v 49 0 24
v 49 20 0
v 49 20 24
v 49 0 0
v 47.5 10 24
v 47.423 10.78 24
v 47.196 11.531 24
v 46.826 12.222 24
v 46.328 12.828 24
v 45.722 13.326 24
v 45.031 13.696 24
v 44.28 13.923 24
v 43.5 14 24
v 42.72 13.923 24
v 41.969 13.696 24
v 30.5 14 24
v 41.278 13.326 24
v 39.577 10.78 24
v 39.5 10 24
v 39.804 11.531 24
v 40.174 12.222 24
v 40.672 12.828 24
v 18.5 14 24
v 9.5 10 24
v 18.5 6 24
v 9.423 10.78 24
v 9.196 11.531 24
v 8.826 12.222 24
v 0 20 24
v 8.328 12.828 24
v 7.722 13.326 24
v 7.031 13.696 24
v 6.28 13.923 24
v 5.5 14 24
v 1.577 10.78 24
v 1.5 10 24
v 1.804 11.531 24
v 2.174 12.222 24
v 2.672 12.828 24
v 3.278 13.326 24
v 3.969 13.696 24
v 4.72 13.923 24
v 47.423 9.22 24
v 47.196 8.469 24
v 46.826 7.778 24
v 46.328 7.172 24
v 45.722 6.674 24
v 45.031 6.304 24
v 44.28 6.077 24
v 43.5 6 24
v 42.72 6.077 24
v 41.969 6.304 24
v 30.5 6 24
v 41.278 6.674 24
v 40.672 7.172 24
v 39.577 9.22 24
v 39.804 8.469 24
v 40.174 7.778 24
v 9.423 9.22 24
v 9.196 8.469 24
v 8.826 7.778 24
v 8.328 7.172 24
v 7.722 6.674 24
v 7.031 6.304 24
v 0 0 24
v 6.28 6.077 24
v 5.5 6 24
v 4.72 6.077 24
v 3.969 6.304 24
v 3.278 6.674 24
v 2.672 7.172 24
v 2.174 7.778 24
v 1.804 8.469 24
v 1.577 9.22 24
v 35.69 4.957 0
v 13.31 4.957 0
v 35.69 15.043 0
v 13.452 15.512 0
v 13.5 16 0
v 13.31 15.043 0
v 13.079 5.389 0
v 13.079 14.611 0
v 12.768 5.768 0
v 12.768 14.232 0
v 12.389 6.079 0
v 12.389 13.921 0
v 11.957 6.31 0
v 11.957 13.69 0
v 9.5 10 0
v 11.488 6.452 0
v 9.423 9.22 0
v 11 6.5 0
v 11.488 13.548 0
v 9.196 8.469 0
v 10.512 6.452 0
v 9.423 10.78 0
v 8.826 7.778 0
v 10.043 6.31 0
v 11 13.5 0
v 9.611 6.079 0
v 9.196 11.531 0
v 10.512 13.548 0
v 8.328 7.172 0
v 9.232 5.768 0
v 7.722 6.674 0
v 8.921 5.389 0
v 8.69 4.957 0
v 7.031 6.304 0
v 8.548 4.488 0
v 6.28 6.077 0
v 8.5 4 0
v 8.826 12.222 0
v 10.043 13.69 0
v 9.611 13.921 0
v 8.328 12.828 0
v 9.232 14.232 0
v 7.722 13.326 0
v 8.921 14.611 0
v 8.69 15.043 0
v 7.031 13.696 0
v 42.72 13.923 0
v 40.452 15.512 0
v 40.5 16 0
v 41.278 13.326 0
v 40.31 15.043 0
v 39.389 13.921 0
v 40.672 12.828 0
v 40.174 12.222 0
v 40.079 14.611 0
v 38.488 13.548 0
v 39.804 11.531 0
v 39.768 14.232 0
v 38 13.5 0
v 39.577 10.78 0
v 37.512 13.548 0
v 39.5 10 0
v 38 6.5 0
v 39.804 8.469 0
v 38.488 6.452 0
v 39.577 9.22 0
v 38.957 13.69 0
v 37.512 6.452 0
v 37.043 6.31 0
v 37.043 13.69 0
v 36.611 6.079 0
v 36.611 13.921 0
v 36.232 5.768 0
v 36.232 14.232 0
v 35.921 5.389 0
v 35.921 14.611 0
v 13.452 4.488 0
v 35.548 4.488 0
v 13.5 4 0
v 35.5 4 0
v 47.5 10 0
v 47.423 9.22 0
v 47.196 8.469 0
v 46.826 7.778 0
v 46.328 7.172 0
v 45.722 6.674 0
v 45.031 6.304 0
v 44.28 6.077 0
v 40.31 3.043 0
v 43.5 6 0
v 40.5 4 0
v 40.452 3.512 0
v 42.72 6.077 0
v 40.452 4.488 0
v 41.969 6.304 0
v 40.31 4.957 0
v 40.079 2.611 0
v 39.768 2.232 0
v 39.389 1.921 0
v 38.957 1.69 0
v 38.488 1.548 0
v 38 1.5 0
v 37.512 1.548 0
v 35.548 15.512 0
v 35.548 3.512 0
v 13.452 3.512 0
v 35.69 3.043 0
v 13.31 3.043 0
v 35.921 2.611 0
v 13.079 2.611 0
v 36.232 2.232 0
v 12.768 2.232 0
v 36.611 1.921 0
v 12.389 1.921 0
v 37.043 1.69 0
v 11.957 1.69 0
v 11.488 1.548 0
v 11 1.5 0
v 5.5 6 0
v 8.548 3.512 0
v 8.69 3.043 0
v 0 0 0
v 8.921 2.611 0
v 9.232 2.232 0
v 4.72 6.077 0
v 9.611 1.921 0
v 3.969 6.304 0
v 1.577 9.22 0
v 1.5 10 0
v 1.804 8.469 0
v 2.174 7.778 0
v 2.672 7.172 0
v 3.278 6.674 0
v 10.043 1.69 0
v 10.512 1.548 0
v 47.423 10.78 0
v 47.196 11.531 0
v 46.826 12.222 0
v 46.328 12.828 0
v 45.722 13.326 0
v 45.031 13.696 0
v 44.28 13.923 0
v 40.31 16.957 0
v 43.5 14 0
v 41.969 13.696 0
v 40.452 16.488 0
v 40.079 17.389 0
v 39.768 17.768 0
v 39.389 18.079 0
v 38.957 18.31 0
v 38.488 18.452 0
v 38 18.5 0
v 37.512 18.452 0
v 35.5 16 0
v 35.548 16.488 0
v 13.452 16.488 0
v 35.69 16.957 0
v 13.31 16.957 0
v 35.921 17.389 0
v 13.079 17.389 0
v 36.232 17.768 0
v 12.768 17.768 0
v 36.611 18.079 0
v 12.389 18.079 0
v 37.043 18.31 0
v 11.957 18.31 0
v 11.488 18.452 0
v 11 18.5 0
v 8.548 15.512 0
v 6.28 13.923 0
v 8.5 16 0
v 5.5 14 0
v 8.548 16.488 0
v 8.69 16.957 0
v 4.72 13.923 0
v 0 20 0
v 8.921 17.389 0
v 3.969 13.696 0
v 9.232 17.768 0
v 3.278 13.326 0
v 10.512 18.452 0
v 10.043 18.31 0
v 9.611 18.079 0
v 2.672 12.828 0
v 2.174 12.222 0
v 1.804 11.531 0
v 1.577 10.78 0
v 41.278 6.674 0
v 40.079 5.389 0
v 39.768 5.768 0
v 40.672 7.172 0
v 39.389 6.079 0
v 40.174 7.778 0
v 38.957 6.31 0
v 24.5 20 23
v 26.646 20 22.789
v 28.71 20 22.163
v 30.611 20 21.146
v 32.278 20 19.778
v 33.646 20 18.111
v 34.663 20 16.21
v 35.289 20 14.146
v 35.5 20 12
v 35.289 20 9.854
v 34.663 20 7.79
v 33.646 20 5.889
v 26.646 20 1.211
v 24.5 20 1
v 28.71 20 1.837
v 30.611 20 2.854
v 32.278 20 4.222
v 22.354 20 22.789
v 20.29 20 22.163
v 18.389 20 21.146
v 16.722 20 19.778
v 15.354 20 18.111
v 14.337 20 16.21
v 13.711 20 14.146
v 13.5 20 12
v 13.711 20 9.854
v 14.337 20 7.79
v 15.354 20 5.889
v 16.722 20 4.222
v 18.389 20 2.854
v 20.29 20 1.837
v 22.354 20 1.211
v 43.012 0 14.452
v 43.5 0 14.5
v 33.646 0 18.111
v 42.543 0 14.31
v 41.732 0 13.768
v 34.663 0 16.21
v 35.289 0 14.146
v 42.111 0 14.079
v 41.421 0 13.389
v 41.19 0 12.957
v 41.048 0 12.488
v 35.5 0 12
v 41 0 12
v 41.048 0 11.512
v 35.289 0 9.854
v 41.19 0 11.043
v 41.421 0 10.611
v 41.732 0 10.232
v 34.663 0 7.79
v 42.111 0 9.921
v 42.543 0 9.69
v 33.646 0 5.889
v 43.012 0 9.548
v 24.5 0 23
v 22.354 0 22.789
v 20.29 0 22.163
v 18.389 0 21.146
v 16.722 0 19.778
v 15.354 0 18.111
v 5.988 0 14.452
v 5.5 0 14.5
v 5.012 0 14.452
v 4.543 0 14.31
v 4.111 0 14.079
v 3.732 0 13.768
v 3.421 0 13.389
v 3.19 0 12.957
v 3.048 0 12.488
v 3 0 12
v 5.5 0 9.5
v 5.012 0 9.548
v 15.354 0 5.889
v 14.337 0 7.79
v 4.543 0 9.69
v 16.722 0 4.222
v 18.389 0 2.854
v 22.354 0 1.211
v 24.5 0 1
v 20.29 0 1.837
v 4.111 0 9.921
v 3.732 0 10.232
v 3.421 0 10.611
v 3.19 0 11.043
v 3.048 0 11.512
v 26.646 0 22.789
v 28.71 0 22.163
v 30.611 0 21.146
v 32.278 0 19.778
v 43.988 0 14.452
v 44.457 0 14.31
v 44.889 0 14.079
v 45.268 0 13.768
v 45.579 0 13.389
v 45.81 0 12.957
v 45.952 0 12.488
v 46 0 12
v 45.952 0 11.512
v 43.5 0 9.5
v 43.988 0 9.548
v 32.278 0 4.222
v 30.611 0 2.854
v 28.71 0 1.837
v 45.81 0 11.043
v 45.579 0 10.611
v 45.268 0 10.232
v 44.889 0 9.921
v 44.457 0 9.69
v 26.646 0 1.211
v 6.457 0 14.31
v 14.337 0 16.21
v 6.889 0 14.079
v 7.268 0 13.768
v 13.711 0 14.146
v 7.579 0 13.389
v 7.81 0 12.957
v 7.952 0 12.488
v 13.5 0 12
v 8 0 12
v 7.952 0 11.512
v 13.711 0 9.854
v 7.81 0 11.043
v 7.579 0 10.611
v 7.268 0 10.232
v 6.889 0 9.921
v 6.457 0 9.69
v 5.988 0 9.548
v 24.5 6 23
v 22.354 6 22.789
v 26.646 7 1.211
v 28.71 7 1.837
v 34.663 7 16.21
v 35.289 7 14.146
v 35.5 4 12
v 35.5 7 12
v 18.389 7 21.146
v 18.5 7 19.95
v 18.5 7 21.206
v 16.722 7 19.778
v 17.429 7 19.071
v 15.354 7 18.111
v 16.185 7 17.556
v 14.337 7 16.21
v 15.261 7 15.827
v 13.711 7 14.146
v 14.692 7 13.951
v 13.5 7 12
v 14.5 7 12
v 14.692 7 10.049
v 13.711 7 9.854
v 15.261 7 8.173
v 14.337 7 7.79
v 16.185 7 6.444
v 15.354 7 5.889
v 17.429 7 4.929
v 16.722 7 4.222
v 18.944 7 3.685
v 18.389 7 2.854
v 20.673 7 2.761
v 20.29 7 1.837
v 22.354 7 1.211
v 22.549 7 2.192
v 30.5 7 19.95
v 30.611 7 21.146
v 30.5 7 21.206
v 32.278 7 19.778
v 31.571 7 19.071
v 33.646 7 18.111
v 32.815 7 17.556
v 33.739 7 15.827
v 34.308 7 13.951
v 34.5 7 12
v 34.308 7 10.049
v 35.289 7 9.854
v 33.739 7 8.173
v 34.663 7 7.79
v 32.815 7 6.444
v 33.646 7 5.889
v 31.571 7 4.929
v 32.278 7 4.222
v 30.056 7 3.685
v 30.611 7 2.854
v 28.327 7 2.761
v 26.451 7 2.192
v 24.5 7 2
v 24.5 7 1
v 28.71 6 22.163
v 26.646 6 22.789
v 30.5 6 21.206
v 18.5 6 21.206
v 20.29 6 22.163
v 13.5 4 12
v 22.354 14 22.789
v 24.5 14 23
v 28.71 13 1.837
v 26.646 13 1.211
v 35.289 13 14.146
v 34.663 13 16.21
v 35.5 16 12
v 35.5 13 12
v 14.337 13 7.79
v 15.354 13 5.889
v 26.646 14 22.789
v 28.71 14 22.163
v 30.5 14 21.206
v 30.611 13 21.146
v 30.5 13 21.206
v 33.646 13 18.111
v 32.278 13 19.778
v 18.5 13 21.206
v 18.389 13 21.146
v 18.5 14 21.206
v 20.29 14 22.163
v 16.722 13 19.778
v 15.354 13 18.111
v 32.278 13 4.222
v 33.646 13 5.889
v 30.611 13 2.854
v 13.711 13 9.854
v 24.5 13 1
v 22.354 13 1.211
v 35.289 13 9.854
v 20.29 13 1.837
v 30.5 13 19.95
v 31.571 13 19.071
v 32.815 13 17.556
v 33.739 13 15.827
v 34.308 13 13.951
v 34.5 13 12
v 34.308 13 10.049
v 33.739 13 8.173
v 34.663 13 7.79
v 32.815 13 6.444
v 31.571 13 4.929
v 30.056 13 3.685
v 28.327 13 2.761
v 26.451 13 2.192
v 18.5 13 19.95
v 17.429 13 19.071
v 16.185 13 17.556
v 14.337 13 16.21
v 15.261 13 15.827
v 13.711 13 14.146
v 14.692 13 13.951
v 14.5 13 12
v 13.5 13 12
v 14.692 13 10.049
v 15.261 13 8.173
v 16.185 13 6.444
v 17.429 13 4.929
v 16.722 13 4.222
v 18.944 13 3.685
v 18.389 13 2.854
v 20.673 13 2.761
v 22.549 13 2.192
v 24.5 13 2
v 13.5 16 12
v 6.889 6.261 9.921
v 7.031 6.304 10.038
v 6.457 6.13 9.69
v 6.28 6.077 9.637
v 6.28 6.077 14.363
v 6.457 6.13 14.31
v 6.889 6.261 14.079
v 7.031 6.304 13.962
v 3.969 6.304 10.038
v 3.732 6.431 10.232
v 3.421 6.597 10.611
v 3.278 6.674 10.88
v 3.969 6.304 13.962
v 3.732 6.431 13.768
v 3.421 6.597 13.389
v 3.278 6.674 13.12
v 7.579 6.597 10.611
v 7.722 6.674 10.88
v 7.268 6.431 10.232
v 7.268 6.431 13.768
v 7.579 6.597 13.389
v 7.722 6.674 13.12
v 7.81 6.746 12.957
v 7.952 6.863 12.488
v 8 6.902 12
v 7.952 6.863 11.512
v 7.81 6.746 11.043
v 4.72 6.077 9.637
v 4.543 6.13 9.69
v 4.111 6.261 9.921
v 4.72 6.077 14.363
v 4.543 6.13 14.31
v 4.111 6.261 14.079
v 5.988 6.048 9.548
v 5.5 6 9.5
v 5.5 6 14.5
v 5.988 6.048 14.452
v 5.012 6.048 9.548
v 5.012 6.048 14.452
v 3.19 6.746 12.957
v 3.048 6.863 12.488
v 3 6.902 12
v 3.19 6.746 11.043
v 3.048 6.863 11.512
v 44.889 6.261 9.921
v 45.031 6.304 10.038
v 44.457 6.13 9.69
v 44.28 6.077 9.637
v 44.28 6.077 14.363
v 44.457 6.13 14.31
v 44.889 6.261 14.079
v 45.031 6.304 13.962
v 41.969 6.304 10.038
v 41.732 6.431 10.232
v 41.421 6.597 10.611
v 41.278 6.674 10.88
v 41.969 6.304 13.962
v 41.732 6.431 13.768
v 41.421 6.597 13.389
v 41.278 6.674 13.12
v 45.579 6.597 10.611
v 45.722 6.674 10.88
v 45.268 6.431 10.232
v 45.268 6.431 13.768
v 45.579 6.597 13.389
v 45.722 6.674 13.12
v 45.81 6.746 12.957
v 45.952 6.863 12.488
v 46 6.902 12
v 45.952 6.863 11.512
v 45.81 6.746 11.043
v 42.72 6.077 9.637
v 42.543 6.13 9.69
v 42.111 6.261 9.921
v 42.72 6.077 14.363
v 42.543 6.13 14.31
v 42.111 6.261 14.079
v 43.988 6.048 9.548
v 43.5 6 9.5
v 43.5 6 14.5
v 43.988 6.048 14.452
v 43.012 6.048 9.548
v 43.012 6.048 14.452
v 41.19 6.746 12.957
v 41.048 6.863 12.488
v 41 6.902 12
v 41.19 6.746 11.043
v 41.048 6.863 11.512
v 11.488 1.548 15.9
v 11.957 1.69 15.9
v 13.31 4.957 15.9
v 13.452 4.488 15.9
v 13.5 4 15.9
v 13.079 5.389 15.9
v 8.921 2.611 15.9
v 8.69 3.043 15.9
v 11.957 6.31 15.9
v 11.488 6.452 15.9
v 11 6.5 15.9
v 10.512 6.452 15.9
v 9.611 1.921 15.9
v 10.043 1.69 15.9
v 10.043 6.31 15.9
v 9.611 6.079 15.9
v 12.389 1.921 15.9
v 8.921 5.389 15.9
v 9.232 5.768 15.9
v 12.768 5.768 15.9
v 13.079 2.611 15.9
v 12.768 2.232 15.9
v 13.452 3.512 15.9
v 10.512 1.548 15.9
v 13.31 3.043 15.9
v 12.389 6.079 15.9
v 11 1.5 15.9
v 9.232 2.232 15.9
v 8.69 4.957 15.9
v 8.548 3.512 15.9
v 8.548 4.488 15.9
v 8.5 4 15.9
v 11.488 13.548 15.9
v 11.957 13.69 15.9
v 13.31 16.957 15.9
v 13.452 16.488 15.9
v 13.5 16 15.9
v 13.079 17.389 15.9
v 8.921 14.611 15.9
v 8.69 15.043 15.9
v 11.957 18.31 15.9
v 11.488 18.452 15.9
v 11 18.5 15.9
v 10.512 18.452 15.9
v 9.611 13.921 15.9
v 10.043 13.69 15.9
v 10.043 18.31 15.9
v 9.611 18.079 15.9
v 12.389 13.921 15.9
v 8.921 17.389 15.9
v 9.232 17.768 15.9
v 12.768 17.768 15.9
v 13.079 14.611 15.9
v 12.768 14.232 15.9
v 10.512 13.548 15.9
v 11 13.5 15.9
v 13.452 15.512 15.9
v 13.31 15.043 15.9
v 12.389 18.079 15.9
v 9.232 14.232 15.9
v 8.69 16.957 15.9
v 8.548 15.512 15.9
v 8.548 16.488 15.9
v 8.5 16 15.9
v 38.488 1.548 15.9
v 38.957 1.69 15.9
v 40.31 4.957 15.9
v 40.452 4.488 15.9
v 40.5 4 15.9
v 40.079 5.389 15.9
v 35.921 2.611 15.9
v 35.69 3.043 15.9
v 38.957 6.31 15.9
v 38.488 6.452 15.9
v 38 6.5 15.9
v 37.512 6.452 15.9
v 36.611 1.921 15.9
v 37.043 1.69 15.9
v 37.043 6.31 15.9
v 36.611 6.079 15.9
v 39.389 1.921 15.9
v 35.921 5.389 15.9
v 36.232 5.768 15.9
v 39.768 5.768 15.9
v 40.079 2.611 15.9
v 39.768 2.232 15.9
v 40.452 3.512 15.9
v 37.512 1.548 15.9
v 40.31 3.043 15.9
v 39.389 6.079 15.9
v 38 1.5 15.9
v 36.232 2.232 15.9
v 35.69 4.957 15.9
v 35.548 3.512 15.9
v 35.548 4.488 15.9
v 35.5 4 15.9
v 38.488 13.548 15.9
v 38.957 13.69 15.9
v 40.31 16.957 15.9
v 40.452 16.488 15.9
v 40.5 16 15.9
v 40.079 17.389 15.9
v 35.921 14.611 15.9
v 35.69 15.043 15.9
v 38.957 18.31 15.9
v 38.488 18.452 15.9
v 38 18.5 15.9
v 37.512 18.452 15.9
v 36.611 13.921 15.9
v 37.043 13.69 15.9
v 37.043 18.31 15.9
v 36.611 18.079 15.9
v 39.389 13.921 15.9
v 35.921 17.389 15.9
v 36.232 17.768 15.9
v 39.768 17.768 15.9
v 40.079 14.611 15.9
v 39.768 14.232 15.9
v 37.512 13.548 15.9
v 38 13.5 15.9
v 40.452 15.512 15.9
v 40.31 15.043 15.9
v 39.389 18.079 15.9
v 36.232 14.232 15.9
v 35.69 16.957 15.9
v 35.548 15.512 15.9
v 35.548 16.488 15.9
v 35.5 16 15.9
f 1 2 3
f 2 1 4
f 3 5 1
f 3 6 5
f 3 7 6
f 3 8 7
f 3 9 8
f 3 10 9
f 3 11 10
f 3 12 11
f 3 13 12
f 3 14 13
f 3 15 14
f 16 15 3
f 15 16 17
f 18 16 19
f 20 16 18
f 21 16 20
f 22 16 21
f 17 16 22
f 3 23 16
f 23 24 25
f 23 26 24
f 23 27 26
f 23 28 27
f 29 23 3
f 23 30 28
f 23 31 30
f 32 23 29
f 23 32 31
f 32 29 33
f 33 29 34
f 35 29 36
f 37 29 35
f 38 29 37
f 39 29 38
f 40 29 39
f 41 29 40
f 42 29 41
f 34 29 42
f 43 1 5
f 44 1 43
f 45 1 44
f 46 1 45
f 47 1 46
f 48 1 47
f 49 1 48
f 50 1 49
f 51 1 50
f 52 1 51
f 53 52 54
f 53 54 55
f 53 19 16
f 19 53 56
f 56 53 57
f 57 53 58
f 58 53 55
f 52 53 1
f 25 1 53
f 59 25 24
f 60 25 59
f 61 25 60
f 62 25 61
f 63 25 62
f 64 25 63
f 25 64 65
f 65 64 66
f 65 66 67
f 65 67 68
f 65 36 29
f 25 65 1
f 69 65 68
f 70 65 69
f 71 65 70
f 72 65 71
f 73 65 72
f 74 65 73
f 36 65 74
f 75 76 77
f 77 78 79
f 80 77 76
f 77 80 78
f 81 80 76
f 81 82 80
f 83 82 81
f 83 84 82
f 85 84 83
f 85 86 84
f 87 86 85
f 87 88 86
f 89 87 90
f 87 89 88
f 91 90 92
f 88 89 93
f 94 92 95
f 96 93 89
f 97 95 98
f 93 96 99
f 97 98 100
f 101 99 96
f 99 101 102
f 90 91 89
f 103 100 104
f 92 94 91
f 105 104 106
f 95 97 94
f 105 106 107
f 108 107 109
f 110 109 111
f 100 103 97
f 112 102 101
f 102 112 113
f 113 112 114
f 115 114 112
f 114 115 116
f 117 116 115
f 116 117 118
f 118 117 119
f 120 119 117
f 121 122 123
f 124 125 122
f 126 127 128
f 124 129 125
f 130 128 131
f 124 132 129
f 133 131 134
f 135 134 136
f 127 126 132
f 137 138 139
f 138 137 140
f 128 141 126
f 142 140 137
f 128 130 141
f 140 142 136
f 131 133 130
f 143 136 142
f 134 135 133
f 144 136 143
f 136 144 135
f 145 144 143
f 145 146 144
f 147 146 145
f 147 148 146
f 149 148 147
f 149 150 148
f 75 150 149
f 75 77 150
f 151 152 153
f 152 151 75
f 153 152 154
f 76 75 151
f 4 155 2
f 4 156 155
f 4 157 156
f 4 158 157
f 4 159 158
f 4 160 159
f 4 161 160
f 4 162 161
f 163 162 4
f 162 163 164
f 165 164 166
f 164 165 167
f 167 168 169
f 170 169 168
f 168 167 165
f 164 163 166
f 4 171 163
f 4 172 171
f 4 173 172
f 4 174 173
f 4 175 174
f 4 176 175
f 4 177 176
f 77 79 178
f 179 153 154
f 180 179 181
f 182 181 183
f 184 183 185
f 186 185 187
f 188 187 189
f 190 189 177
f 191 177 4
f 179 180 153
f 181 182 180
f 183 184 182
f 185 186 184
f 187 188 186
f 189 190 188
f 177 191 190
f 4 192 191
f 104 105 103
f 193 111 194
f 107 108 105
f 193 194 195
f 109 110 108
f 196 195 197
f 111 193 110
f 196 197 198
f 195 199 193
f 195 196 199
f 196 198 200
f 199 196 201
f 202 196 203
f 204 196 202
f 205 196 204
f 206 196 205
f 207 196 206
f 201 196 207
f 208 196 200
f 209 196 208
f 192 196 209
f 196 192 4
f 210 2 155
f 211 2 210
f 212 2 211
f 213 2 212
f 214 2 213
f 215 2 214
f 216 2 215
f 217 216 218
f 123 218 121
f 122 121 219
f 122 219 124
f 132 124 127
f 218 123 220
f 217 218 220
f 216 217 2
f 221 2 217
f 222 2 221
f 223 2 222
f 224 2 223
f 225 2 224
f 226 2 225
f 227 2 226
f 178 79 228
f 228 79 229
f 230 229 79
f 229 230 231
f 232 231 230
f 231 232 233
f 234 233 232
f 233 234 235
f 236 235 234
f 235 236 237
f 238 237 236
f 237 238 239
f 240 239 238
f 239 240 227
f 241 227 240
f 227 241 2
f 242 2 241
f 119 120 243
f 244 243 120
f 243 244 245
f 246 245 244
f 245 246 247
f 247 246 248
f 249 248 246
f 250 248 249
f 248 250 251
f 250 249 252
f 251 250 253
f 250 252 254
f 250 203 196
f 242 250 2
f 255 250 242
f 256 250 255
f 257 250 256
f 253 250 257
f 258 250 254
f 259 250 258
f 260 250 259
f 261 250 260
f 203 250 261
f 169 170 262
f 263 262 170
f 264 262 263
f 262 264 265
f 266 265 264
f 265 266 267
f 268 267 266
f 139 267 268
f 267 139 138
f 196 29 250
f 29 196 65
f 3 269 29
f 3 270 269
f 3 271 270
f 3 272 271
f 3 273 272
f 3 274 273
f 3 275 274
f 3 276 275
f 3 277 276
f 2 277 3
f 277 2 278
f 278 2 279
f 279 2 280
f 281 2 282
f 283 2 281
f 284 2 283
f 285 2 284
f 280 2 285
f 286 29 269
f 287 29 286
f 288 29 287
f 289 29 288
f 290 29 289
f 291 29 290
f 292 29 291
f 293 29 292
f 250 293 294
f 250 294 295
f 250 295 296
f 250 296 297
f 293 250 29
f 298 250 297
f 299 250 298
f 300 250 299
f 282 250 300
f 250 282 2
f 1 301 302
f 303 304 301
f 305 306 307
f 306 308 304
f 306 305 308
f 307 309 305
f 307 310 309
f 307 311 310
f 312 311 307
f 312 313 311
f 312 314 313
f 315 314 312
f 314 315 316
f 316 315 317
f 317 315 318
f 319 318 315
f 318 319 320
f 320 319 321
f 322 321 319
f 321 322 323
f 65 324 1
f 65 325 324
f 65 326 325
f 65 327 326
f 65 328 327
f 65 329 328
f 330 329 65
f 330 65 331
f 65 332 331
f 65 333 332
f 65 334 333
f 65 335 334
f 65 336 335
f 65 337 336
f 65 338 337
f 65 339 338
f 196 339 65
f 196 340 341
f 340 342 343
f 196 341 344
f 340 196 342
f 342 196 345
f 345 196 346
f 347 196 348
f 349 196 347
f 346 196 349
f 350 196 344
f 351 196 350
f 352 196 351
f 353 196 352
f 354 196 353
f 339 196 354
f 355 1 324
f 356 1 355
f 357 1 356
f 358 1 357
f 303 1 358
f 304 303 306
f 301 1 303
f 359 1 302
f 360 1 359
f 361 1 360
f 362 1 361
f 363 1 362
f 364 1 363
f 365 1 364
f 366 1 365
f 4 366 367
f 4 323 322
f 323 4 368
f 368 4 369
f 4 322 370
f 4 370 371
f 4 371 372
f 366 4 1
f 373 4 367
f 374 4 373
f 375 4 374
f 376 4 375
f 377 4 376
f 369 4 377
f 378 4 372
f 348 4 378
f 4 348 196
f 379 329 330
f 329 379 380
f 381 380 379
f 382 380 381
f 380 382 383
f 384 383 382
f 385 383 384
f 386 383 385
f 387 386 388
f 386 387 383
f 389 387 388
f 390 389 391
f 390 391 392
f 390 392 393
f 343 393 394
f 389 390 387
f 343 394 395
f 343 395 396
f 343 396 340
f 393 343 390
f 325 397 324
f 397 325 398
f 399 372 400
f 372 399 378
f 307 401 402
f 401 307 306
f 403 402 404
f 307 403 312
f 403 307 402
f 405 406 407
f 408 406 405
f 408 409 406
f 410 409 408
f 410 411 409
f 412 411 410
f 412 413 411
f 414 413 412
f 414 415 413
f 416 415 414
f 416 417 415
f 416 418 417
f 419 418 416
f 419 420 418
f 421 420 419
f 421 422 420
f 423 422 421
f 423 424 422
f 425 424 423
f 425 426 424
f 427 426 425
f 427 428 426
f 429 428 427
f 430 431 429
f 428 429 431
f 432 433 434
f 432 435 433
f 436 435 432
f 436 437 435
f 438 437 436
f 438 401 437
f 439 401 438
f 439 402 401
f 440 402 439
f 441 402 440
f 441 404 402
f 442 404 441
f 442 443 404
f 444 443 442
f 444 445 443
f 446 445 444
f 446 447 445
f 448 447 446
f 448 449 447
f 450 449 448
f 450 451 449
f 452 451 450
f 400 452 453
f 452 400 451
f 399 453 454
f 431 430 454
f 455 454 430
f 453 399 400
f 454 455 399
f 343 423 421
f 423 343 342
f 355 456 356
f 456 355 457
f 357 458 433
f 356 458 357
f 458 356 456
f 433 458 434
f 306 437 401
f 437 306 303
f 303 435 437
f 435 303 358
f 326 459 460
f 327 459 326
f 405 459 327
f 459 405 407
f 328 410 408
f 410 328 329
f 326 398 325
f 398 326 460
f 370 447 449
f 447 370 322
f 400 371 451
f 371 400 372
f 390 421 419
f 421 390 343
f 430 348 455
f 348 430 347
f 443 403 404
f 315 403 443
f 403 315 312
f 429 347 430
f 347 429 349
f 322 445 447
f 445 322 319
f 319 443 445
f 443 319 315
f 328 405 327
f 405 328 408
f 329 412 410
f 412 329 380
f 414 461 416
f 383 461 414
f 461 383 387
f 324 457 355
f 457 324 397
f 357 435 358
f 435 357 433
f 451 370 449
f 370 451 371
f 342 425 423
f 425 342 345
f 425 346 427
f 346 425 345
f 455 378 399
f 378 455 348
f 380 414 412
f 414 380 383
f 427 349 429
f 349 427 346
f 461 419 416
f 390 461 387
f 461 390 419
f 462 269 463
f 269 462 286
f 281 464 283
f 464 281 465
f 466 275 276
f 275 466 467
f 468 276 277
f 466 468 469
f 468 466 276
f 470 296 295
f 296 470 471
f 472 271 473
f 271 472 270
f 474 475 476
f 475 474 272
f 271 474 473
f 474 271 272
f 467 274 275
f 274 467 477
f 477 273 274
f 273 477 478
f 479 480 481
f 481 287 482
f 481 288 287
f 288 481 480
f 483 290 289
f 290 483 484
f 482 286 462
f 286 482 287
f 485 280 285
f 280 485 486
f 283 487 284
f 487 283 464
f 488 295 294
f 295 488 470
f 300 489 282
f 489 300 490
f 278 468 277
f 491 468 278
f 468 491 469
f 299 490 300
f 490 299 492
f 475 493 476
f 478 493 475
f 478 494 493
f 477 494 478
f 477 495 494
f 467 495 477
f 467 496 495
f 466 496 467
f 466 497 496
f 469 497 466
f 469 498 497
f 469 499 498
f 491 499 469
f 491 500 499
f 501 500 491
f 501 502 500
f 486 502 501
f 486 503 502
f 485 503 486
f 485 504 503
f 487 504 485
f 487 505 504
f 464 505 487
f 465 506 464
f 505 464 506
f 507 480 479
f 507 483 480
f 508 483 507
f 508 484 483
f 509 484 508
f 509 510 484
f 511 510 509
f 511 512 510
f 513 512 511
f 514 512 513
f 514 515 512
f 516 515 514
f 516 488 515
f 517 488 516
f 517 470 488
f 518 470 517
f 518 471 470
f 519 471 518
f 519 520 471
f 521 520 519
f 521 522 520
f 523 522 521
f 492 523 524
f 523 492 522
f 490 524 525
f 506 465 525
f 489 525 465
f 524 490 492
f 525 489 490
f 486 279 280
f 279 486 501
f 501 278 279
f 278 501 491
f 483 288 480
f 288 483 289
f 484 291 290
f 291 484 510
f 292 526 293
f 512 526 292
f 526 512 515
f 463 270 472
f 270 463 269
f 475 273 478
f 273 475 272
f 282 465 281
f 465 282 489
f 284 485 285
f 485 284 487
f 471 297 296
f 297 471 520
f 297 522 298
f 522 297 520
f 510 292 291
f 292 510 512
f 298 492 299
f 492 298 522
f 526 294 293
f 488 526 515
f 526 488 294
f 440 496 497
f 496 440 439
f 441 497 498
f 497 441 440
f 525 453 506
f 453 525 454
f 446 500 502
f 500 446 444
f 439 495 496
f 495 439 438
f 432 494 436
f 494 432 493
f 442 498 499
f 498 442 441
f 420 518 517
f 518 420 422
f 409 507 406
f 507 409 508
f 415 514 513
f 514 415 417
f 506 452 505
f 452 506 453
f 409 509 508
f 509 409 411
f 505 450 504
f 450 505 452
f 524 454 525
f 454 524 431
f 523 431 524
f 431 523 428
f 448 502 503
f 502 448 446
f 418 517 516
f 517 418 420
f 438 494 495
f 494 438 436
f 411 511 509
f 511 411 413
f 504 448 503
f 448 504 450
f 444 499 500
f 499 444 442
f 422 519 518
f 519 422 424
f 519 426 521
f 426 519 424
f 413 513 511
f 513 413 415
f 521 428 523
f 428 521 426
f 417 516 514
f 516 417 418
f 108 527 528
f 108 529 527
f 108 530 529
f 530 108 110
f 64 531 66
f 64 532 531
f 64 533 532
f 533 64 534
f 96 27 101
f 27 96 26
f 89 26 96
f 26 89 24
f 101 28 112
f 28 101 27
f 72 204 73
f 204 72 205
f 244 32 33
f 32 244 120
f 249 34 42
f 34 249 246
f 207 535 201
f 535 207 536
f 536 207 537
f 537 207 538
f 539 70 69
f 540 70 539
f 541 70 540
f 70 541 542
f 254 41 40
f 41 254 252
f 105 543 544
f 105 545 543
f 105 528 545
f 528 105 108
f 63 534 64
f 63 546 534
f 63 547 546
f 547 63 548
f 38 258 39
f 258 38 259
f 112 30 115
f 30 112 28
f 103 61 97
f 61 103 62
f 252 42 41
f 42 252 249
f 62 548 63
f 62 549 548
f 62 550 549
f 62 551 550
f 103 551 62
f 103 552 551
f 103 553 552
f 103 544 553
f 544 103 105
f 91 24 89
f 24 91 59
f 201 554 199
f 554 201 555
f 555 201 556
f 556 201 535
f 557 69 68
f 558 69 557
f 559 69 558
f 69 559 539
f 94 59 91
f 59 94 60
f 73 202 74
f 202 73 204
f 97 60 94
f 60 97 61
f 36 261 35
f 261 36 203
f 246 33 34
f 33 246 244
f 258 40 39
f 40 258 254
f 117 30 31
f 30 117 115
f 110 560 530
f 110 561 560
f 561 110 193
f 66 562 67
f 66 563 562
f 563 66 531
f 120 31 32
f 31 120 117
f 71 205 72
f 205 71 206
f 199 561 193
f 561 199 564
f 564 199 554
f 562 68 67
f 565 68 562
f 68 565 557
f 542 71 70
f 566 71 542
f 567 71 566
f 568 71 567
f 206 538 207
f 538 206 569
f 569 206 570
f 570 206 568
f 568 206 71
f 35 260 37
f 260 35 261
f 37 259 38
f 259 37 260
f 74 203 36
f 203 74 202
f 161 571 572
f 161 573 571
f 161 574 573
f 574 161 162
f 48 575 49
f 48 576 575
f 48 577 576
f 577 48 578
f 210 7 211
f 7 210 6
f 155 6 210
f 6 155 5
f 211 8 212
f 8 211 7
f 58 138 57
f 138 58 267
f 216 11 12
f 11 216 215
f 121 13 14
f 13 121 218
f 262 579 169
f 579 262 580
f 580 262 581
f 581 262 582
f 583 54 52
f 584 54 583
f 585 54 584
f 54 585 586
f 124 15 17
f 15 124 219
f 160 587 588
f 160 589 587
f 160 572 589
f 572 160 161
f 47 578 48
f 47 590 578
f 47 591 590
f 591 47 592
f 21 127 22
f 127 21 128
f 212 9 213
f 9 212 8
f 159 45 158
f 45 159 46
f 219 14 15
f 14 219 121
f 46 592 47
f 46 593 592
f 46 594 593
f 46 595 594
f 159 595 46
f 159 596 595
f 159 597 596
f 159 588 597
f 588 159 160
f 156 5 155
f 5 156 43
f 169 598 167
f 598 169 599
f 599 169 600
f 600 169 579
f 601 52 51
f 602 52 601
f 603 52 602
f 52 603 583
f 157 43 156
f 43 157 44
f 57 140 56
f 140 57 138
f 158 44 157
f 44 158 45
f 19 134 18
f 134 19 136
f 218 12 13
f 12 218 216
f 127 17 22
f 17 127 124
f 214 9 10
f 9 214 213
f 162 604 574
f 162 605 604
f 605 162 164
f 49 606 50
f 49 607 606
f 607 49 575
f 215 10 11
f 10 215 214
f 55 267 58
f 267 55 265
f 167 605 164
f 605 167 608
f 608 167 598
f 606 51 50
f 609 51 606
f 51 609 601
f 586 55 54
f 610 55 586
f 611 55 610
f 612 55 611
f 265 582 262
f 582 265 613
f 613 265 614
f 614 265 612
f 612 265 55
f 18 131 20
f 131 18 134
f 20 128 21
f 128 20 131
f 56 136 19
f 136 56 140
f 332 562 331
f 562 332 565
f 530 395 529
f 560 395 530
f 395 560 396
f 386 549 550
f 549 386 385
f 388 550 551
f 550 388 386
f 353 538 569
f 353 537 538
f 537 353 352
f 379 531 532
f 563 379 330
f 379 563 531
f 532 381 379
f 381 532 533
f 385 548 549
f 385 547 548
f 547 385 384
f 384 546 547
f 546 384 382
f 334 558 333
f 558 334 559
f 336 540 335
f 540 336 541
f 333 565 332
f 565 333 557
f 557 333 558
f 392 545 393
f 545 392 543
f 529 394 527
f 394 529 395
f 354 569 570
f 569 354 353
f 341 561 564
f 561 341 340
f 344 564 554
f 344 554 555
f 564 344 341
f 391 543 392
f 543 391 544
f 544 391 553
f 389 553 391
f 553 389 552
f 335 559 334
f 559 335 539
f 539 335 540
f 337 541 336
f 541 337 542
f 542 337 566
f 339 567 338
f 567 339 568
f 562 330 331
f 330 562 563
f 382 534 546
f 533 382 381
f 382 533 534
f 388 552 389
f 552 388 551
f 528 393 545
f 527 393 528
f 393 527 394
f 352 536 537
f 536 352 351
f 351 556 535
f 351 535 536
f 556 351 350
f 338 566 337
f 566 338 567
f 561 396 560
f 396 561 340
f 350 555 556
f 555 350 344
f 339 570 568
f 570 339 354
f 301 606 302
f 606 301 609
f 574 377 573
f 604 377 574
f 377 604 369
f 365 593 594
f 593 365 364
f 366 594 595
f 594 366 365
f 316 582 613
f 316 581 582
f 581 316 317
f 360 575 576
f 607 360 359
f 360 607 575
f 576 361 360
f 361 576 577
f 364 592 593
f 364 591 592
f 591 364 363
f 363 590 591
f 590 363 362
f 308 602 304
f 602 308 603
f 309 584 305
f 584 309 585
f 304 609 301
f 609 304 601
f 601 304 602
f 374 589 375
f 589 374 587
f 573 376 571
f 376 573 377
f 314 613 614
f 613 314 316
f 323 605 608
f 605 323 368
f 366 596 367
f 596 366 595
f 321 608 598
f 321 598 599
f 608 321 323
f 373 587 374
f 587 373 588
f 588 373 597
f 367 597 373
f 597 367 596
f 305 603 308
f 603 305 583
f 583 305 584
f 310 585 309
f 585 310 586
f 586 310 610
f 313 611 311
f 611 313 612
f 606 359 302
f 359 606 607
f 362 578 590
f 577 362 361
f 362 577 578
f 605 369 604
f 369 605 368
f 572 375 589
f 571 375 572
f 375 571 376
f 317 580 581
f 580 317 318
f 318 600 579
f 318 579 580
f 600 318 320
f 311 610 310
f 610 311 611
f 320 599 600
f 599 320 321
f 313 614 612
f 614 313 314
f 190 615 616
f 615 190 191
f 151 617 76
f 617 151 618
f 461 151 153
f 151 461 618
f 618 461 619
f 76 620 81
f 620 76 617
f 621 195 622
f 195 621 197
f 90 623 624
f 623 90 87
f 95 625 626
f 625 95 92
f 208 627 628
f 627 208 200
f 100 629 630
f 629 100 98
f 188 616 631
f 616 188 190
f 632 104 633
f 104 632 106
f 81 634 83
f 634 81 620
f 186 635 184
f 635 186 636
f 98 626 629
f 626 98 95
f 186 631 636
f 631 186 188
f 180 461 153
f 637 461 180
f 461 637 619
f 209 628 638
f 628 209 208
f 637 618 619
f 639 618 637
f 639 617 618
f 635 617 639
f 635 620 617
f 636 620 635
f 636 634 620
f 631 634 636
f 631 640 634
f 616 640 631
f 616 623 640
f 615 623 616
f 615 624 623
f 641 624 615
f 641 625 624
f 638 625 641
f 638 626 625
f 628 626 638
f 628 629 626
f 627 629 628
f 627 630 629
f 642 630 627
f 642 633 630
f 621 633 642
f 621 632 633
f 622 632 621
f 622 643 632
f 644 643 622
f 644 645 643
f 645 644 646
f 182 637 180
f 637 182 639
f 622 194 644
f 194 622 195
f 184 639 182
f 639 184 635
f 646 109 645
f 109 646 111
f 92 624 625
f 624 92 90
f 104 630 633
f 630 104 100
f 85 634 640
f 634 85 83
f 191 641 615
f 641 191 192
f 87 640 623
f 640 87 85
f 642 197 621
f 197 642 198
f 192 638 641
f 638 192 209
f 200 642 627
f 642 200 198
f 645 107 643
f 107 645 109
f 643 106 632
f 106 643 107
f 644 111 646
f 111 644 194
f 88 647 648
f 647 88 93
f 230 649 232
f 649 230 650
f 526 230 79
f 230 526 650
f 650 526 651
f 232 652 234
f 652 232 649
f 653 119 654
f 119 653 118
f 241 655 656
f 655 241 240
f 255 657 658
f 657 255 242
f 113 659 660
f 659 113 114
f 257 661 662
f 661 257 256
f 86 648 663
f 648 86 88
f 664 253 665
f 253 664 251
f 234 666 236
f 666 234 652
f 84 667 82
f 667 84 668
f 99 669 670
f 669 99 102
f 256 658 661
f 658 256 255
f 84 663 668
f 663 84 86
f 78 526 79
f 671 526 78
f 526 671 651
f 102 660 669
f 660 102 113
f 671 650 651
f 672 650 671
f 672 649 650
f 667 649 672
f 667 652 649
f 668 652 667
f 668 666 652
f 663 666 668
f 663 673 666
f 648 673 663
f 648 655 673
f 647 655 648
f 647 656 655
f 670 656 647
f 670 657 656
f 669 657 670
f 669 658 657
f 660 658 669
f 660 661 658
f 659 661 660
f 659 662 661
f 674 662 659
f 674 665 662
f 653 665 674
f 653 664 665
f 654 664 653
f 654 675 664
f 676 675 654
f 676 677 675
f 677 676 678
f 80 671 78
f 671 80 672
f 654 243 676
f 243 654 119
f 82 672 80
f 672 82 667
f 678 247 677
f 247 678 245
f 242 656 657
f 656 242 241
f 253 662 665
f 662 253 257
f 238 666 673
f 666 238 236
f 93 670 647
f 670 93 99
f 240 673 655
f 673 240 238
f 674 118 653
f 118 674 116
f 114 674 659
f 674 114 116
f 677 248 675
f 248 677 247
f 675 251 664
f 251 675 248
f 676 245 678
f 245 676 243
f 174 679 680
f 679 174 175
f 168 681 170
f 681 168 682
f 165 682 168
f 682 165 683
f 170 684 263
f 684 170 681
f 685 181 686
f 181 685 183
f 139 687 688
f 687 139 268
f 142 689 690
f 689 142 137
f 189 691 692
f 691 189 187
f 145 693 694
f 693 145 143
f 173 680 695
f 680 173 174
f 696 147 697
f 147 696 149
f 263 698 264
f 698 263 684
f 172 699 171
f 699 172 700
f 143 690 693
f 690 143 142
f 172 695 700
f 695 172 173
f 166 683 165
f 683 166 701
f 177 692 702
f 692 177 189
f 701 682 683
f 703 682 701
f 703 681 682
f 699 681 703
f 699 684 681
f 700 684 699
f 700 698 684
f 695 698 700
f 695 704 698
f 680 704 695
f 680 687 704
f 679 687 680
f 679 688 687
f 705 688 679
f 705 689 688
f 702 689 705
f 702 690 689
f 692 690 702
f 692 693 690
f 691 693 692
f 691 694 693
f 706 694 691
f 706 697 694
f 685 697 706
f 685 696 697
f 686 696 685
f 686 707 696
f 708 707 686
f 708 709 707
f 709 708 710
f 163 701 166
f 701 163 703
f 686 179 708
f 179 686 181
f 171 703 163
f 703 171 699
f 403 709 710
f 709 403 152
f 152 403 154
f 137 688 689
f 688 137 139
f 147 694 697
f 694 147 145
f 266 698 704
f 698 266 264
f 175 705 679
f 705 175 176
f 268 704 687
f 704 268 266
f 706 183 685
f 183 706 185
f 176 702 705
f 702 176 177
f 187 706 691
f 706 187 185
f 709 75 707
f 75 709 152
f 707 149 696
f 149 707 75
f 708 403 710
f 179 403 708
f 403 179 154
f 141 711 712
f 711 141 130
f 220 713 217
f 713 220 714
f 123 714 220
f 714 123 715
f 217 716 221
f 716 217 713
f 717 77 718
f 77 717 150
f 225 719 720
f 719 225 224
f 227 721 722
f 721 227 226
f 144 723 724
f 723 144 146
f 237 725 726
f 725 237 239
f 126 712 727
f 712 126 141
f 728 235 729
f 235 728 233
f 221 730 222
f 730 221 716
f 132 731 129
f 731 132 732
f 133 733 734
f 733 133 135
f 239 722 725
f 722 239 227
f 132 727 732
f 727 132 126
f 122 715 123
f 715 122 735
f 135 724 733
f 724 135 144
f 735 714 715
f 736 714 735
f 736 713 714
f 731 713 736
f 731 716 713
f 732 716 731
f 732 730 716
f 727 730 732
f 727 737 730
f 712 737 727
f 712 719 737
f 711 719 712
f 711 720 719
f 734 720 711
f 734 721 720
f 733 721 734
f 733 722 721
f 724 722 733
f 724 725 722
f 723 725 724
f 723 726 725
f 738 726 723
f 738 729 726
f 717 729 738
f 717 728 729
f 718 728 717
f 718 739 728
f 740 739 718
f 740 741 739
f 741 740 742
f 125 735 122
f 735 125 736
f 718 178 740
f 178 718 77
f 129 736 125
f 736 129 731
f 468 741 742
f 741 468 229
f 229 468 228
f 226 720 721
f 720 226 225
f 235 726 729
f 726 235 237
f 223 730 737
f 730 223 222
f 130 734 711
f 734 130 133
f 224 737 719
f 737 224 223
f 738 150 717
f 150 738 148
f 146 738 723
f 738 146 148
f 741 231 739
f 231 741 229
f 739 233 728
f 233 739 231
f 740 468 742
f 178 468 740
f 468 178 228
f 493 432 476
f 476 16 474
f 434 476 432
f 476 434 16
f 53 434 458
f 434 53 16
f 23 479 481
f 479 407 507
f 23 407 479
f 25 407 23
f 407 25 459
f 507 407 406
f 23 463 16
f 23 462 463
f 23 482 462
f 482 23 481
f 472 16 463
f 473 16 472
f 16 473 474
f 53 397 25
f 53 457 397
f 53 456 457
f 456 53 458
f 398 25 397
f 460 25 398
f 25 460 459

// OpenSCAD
$fn=32;

segment_length = 50;
tower_distance = segment_length-3;

length = tower_distance + 2;
width = 20;
height = 24;

echo("length", length);


difference() {
color([0, 0, 1]) cube([length, width, height]);


// bearing holes
translate([length/2, 7, height/2]) rotate([90,0,0]) 
	cylinder(r=22/2, h=7.1);
translate([length/2, 20+0.1, height/2]) rotate([90,0,0]) 
	cylinder(r=22/2, h=7.1);

// bearing through hole
translate([length/2, 25, height/2]) rotate([90,0,0]) 
	cylinder(r=20/2, h=30);


// Rod holes
translate([4+1.5, width/2, -0.1]) cylinder(r=4,h=30);
translate([length-(4+1.5), width/2, -0.1]) cylinder(r=4,h=30);

// rod holding threaded screw holes
translate([4+1.5, width/2, height/2]) rotate([90,0,0]) 
	cylinder(r=5/2, h=11);
translate([length-(4+1.5), width/2, height/2]) rotate([90,0,0]) 
	cylinder(r=5/2, h=11);

// mounting screw holes
//translate([(length/2)-(22/2), width/2, -0.1]) cylinder(r=5/2,h=height+0.2);
translate([11, 4, -0.1]) cylinder(r=5/2,h=16);
translate([11, width-4, -0.1]) cylinder(r=5/2,h=16);
translate([length-11, 4, -0.1]) cylinder(r=5/2,h=16);
translate([length-11, width-4, -0.1]) cylinder(r=5/2,h=16);

// belt path
translate([(length/2)-(12/2), (width/2)-(8/2), (height/2)+0.1]) cube([12,8,height/2]);

};
